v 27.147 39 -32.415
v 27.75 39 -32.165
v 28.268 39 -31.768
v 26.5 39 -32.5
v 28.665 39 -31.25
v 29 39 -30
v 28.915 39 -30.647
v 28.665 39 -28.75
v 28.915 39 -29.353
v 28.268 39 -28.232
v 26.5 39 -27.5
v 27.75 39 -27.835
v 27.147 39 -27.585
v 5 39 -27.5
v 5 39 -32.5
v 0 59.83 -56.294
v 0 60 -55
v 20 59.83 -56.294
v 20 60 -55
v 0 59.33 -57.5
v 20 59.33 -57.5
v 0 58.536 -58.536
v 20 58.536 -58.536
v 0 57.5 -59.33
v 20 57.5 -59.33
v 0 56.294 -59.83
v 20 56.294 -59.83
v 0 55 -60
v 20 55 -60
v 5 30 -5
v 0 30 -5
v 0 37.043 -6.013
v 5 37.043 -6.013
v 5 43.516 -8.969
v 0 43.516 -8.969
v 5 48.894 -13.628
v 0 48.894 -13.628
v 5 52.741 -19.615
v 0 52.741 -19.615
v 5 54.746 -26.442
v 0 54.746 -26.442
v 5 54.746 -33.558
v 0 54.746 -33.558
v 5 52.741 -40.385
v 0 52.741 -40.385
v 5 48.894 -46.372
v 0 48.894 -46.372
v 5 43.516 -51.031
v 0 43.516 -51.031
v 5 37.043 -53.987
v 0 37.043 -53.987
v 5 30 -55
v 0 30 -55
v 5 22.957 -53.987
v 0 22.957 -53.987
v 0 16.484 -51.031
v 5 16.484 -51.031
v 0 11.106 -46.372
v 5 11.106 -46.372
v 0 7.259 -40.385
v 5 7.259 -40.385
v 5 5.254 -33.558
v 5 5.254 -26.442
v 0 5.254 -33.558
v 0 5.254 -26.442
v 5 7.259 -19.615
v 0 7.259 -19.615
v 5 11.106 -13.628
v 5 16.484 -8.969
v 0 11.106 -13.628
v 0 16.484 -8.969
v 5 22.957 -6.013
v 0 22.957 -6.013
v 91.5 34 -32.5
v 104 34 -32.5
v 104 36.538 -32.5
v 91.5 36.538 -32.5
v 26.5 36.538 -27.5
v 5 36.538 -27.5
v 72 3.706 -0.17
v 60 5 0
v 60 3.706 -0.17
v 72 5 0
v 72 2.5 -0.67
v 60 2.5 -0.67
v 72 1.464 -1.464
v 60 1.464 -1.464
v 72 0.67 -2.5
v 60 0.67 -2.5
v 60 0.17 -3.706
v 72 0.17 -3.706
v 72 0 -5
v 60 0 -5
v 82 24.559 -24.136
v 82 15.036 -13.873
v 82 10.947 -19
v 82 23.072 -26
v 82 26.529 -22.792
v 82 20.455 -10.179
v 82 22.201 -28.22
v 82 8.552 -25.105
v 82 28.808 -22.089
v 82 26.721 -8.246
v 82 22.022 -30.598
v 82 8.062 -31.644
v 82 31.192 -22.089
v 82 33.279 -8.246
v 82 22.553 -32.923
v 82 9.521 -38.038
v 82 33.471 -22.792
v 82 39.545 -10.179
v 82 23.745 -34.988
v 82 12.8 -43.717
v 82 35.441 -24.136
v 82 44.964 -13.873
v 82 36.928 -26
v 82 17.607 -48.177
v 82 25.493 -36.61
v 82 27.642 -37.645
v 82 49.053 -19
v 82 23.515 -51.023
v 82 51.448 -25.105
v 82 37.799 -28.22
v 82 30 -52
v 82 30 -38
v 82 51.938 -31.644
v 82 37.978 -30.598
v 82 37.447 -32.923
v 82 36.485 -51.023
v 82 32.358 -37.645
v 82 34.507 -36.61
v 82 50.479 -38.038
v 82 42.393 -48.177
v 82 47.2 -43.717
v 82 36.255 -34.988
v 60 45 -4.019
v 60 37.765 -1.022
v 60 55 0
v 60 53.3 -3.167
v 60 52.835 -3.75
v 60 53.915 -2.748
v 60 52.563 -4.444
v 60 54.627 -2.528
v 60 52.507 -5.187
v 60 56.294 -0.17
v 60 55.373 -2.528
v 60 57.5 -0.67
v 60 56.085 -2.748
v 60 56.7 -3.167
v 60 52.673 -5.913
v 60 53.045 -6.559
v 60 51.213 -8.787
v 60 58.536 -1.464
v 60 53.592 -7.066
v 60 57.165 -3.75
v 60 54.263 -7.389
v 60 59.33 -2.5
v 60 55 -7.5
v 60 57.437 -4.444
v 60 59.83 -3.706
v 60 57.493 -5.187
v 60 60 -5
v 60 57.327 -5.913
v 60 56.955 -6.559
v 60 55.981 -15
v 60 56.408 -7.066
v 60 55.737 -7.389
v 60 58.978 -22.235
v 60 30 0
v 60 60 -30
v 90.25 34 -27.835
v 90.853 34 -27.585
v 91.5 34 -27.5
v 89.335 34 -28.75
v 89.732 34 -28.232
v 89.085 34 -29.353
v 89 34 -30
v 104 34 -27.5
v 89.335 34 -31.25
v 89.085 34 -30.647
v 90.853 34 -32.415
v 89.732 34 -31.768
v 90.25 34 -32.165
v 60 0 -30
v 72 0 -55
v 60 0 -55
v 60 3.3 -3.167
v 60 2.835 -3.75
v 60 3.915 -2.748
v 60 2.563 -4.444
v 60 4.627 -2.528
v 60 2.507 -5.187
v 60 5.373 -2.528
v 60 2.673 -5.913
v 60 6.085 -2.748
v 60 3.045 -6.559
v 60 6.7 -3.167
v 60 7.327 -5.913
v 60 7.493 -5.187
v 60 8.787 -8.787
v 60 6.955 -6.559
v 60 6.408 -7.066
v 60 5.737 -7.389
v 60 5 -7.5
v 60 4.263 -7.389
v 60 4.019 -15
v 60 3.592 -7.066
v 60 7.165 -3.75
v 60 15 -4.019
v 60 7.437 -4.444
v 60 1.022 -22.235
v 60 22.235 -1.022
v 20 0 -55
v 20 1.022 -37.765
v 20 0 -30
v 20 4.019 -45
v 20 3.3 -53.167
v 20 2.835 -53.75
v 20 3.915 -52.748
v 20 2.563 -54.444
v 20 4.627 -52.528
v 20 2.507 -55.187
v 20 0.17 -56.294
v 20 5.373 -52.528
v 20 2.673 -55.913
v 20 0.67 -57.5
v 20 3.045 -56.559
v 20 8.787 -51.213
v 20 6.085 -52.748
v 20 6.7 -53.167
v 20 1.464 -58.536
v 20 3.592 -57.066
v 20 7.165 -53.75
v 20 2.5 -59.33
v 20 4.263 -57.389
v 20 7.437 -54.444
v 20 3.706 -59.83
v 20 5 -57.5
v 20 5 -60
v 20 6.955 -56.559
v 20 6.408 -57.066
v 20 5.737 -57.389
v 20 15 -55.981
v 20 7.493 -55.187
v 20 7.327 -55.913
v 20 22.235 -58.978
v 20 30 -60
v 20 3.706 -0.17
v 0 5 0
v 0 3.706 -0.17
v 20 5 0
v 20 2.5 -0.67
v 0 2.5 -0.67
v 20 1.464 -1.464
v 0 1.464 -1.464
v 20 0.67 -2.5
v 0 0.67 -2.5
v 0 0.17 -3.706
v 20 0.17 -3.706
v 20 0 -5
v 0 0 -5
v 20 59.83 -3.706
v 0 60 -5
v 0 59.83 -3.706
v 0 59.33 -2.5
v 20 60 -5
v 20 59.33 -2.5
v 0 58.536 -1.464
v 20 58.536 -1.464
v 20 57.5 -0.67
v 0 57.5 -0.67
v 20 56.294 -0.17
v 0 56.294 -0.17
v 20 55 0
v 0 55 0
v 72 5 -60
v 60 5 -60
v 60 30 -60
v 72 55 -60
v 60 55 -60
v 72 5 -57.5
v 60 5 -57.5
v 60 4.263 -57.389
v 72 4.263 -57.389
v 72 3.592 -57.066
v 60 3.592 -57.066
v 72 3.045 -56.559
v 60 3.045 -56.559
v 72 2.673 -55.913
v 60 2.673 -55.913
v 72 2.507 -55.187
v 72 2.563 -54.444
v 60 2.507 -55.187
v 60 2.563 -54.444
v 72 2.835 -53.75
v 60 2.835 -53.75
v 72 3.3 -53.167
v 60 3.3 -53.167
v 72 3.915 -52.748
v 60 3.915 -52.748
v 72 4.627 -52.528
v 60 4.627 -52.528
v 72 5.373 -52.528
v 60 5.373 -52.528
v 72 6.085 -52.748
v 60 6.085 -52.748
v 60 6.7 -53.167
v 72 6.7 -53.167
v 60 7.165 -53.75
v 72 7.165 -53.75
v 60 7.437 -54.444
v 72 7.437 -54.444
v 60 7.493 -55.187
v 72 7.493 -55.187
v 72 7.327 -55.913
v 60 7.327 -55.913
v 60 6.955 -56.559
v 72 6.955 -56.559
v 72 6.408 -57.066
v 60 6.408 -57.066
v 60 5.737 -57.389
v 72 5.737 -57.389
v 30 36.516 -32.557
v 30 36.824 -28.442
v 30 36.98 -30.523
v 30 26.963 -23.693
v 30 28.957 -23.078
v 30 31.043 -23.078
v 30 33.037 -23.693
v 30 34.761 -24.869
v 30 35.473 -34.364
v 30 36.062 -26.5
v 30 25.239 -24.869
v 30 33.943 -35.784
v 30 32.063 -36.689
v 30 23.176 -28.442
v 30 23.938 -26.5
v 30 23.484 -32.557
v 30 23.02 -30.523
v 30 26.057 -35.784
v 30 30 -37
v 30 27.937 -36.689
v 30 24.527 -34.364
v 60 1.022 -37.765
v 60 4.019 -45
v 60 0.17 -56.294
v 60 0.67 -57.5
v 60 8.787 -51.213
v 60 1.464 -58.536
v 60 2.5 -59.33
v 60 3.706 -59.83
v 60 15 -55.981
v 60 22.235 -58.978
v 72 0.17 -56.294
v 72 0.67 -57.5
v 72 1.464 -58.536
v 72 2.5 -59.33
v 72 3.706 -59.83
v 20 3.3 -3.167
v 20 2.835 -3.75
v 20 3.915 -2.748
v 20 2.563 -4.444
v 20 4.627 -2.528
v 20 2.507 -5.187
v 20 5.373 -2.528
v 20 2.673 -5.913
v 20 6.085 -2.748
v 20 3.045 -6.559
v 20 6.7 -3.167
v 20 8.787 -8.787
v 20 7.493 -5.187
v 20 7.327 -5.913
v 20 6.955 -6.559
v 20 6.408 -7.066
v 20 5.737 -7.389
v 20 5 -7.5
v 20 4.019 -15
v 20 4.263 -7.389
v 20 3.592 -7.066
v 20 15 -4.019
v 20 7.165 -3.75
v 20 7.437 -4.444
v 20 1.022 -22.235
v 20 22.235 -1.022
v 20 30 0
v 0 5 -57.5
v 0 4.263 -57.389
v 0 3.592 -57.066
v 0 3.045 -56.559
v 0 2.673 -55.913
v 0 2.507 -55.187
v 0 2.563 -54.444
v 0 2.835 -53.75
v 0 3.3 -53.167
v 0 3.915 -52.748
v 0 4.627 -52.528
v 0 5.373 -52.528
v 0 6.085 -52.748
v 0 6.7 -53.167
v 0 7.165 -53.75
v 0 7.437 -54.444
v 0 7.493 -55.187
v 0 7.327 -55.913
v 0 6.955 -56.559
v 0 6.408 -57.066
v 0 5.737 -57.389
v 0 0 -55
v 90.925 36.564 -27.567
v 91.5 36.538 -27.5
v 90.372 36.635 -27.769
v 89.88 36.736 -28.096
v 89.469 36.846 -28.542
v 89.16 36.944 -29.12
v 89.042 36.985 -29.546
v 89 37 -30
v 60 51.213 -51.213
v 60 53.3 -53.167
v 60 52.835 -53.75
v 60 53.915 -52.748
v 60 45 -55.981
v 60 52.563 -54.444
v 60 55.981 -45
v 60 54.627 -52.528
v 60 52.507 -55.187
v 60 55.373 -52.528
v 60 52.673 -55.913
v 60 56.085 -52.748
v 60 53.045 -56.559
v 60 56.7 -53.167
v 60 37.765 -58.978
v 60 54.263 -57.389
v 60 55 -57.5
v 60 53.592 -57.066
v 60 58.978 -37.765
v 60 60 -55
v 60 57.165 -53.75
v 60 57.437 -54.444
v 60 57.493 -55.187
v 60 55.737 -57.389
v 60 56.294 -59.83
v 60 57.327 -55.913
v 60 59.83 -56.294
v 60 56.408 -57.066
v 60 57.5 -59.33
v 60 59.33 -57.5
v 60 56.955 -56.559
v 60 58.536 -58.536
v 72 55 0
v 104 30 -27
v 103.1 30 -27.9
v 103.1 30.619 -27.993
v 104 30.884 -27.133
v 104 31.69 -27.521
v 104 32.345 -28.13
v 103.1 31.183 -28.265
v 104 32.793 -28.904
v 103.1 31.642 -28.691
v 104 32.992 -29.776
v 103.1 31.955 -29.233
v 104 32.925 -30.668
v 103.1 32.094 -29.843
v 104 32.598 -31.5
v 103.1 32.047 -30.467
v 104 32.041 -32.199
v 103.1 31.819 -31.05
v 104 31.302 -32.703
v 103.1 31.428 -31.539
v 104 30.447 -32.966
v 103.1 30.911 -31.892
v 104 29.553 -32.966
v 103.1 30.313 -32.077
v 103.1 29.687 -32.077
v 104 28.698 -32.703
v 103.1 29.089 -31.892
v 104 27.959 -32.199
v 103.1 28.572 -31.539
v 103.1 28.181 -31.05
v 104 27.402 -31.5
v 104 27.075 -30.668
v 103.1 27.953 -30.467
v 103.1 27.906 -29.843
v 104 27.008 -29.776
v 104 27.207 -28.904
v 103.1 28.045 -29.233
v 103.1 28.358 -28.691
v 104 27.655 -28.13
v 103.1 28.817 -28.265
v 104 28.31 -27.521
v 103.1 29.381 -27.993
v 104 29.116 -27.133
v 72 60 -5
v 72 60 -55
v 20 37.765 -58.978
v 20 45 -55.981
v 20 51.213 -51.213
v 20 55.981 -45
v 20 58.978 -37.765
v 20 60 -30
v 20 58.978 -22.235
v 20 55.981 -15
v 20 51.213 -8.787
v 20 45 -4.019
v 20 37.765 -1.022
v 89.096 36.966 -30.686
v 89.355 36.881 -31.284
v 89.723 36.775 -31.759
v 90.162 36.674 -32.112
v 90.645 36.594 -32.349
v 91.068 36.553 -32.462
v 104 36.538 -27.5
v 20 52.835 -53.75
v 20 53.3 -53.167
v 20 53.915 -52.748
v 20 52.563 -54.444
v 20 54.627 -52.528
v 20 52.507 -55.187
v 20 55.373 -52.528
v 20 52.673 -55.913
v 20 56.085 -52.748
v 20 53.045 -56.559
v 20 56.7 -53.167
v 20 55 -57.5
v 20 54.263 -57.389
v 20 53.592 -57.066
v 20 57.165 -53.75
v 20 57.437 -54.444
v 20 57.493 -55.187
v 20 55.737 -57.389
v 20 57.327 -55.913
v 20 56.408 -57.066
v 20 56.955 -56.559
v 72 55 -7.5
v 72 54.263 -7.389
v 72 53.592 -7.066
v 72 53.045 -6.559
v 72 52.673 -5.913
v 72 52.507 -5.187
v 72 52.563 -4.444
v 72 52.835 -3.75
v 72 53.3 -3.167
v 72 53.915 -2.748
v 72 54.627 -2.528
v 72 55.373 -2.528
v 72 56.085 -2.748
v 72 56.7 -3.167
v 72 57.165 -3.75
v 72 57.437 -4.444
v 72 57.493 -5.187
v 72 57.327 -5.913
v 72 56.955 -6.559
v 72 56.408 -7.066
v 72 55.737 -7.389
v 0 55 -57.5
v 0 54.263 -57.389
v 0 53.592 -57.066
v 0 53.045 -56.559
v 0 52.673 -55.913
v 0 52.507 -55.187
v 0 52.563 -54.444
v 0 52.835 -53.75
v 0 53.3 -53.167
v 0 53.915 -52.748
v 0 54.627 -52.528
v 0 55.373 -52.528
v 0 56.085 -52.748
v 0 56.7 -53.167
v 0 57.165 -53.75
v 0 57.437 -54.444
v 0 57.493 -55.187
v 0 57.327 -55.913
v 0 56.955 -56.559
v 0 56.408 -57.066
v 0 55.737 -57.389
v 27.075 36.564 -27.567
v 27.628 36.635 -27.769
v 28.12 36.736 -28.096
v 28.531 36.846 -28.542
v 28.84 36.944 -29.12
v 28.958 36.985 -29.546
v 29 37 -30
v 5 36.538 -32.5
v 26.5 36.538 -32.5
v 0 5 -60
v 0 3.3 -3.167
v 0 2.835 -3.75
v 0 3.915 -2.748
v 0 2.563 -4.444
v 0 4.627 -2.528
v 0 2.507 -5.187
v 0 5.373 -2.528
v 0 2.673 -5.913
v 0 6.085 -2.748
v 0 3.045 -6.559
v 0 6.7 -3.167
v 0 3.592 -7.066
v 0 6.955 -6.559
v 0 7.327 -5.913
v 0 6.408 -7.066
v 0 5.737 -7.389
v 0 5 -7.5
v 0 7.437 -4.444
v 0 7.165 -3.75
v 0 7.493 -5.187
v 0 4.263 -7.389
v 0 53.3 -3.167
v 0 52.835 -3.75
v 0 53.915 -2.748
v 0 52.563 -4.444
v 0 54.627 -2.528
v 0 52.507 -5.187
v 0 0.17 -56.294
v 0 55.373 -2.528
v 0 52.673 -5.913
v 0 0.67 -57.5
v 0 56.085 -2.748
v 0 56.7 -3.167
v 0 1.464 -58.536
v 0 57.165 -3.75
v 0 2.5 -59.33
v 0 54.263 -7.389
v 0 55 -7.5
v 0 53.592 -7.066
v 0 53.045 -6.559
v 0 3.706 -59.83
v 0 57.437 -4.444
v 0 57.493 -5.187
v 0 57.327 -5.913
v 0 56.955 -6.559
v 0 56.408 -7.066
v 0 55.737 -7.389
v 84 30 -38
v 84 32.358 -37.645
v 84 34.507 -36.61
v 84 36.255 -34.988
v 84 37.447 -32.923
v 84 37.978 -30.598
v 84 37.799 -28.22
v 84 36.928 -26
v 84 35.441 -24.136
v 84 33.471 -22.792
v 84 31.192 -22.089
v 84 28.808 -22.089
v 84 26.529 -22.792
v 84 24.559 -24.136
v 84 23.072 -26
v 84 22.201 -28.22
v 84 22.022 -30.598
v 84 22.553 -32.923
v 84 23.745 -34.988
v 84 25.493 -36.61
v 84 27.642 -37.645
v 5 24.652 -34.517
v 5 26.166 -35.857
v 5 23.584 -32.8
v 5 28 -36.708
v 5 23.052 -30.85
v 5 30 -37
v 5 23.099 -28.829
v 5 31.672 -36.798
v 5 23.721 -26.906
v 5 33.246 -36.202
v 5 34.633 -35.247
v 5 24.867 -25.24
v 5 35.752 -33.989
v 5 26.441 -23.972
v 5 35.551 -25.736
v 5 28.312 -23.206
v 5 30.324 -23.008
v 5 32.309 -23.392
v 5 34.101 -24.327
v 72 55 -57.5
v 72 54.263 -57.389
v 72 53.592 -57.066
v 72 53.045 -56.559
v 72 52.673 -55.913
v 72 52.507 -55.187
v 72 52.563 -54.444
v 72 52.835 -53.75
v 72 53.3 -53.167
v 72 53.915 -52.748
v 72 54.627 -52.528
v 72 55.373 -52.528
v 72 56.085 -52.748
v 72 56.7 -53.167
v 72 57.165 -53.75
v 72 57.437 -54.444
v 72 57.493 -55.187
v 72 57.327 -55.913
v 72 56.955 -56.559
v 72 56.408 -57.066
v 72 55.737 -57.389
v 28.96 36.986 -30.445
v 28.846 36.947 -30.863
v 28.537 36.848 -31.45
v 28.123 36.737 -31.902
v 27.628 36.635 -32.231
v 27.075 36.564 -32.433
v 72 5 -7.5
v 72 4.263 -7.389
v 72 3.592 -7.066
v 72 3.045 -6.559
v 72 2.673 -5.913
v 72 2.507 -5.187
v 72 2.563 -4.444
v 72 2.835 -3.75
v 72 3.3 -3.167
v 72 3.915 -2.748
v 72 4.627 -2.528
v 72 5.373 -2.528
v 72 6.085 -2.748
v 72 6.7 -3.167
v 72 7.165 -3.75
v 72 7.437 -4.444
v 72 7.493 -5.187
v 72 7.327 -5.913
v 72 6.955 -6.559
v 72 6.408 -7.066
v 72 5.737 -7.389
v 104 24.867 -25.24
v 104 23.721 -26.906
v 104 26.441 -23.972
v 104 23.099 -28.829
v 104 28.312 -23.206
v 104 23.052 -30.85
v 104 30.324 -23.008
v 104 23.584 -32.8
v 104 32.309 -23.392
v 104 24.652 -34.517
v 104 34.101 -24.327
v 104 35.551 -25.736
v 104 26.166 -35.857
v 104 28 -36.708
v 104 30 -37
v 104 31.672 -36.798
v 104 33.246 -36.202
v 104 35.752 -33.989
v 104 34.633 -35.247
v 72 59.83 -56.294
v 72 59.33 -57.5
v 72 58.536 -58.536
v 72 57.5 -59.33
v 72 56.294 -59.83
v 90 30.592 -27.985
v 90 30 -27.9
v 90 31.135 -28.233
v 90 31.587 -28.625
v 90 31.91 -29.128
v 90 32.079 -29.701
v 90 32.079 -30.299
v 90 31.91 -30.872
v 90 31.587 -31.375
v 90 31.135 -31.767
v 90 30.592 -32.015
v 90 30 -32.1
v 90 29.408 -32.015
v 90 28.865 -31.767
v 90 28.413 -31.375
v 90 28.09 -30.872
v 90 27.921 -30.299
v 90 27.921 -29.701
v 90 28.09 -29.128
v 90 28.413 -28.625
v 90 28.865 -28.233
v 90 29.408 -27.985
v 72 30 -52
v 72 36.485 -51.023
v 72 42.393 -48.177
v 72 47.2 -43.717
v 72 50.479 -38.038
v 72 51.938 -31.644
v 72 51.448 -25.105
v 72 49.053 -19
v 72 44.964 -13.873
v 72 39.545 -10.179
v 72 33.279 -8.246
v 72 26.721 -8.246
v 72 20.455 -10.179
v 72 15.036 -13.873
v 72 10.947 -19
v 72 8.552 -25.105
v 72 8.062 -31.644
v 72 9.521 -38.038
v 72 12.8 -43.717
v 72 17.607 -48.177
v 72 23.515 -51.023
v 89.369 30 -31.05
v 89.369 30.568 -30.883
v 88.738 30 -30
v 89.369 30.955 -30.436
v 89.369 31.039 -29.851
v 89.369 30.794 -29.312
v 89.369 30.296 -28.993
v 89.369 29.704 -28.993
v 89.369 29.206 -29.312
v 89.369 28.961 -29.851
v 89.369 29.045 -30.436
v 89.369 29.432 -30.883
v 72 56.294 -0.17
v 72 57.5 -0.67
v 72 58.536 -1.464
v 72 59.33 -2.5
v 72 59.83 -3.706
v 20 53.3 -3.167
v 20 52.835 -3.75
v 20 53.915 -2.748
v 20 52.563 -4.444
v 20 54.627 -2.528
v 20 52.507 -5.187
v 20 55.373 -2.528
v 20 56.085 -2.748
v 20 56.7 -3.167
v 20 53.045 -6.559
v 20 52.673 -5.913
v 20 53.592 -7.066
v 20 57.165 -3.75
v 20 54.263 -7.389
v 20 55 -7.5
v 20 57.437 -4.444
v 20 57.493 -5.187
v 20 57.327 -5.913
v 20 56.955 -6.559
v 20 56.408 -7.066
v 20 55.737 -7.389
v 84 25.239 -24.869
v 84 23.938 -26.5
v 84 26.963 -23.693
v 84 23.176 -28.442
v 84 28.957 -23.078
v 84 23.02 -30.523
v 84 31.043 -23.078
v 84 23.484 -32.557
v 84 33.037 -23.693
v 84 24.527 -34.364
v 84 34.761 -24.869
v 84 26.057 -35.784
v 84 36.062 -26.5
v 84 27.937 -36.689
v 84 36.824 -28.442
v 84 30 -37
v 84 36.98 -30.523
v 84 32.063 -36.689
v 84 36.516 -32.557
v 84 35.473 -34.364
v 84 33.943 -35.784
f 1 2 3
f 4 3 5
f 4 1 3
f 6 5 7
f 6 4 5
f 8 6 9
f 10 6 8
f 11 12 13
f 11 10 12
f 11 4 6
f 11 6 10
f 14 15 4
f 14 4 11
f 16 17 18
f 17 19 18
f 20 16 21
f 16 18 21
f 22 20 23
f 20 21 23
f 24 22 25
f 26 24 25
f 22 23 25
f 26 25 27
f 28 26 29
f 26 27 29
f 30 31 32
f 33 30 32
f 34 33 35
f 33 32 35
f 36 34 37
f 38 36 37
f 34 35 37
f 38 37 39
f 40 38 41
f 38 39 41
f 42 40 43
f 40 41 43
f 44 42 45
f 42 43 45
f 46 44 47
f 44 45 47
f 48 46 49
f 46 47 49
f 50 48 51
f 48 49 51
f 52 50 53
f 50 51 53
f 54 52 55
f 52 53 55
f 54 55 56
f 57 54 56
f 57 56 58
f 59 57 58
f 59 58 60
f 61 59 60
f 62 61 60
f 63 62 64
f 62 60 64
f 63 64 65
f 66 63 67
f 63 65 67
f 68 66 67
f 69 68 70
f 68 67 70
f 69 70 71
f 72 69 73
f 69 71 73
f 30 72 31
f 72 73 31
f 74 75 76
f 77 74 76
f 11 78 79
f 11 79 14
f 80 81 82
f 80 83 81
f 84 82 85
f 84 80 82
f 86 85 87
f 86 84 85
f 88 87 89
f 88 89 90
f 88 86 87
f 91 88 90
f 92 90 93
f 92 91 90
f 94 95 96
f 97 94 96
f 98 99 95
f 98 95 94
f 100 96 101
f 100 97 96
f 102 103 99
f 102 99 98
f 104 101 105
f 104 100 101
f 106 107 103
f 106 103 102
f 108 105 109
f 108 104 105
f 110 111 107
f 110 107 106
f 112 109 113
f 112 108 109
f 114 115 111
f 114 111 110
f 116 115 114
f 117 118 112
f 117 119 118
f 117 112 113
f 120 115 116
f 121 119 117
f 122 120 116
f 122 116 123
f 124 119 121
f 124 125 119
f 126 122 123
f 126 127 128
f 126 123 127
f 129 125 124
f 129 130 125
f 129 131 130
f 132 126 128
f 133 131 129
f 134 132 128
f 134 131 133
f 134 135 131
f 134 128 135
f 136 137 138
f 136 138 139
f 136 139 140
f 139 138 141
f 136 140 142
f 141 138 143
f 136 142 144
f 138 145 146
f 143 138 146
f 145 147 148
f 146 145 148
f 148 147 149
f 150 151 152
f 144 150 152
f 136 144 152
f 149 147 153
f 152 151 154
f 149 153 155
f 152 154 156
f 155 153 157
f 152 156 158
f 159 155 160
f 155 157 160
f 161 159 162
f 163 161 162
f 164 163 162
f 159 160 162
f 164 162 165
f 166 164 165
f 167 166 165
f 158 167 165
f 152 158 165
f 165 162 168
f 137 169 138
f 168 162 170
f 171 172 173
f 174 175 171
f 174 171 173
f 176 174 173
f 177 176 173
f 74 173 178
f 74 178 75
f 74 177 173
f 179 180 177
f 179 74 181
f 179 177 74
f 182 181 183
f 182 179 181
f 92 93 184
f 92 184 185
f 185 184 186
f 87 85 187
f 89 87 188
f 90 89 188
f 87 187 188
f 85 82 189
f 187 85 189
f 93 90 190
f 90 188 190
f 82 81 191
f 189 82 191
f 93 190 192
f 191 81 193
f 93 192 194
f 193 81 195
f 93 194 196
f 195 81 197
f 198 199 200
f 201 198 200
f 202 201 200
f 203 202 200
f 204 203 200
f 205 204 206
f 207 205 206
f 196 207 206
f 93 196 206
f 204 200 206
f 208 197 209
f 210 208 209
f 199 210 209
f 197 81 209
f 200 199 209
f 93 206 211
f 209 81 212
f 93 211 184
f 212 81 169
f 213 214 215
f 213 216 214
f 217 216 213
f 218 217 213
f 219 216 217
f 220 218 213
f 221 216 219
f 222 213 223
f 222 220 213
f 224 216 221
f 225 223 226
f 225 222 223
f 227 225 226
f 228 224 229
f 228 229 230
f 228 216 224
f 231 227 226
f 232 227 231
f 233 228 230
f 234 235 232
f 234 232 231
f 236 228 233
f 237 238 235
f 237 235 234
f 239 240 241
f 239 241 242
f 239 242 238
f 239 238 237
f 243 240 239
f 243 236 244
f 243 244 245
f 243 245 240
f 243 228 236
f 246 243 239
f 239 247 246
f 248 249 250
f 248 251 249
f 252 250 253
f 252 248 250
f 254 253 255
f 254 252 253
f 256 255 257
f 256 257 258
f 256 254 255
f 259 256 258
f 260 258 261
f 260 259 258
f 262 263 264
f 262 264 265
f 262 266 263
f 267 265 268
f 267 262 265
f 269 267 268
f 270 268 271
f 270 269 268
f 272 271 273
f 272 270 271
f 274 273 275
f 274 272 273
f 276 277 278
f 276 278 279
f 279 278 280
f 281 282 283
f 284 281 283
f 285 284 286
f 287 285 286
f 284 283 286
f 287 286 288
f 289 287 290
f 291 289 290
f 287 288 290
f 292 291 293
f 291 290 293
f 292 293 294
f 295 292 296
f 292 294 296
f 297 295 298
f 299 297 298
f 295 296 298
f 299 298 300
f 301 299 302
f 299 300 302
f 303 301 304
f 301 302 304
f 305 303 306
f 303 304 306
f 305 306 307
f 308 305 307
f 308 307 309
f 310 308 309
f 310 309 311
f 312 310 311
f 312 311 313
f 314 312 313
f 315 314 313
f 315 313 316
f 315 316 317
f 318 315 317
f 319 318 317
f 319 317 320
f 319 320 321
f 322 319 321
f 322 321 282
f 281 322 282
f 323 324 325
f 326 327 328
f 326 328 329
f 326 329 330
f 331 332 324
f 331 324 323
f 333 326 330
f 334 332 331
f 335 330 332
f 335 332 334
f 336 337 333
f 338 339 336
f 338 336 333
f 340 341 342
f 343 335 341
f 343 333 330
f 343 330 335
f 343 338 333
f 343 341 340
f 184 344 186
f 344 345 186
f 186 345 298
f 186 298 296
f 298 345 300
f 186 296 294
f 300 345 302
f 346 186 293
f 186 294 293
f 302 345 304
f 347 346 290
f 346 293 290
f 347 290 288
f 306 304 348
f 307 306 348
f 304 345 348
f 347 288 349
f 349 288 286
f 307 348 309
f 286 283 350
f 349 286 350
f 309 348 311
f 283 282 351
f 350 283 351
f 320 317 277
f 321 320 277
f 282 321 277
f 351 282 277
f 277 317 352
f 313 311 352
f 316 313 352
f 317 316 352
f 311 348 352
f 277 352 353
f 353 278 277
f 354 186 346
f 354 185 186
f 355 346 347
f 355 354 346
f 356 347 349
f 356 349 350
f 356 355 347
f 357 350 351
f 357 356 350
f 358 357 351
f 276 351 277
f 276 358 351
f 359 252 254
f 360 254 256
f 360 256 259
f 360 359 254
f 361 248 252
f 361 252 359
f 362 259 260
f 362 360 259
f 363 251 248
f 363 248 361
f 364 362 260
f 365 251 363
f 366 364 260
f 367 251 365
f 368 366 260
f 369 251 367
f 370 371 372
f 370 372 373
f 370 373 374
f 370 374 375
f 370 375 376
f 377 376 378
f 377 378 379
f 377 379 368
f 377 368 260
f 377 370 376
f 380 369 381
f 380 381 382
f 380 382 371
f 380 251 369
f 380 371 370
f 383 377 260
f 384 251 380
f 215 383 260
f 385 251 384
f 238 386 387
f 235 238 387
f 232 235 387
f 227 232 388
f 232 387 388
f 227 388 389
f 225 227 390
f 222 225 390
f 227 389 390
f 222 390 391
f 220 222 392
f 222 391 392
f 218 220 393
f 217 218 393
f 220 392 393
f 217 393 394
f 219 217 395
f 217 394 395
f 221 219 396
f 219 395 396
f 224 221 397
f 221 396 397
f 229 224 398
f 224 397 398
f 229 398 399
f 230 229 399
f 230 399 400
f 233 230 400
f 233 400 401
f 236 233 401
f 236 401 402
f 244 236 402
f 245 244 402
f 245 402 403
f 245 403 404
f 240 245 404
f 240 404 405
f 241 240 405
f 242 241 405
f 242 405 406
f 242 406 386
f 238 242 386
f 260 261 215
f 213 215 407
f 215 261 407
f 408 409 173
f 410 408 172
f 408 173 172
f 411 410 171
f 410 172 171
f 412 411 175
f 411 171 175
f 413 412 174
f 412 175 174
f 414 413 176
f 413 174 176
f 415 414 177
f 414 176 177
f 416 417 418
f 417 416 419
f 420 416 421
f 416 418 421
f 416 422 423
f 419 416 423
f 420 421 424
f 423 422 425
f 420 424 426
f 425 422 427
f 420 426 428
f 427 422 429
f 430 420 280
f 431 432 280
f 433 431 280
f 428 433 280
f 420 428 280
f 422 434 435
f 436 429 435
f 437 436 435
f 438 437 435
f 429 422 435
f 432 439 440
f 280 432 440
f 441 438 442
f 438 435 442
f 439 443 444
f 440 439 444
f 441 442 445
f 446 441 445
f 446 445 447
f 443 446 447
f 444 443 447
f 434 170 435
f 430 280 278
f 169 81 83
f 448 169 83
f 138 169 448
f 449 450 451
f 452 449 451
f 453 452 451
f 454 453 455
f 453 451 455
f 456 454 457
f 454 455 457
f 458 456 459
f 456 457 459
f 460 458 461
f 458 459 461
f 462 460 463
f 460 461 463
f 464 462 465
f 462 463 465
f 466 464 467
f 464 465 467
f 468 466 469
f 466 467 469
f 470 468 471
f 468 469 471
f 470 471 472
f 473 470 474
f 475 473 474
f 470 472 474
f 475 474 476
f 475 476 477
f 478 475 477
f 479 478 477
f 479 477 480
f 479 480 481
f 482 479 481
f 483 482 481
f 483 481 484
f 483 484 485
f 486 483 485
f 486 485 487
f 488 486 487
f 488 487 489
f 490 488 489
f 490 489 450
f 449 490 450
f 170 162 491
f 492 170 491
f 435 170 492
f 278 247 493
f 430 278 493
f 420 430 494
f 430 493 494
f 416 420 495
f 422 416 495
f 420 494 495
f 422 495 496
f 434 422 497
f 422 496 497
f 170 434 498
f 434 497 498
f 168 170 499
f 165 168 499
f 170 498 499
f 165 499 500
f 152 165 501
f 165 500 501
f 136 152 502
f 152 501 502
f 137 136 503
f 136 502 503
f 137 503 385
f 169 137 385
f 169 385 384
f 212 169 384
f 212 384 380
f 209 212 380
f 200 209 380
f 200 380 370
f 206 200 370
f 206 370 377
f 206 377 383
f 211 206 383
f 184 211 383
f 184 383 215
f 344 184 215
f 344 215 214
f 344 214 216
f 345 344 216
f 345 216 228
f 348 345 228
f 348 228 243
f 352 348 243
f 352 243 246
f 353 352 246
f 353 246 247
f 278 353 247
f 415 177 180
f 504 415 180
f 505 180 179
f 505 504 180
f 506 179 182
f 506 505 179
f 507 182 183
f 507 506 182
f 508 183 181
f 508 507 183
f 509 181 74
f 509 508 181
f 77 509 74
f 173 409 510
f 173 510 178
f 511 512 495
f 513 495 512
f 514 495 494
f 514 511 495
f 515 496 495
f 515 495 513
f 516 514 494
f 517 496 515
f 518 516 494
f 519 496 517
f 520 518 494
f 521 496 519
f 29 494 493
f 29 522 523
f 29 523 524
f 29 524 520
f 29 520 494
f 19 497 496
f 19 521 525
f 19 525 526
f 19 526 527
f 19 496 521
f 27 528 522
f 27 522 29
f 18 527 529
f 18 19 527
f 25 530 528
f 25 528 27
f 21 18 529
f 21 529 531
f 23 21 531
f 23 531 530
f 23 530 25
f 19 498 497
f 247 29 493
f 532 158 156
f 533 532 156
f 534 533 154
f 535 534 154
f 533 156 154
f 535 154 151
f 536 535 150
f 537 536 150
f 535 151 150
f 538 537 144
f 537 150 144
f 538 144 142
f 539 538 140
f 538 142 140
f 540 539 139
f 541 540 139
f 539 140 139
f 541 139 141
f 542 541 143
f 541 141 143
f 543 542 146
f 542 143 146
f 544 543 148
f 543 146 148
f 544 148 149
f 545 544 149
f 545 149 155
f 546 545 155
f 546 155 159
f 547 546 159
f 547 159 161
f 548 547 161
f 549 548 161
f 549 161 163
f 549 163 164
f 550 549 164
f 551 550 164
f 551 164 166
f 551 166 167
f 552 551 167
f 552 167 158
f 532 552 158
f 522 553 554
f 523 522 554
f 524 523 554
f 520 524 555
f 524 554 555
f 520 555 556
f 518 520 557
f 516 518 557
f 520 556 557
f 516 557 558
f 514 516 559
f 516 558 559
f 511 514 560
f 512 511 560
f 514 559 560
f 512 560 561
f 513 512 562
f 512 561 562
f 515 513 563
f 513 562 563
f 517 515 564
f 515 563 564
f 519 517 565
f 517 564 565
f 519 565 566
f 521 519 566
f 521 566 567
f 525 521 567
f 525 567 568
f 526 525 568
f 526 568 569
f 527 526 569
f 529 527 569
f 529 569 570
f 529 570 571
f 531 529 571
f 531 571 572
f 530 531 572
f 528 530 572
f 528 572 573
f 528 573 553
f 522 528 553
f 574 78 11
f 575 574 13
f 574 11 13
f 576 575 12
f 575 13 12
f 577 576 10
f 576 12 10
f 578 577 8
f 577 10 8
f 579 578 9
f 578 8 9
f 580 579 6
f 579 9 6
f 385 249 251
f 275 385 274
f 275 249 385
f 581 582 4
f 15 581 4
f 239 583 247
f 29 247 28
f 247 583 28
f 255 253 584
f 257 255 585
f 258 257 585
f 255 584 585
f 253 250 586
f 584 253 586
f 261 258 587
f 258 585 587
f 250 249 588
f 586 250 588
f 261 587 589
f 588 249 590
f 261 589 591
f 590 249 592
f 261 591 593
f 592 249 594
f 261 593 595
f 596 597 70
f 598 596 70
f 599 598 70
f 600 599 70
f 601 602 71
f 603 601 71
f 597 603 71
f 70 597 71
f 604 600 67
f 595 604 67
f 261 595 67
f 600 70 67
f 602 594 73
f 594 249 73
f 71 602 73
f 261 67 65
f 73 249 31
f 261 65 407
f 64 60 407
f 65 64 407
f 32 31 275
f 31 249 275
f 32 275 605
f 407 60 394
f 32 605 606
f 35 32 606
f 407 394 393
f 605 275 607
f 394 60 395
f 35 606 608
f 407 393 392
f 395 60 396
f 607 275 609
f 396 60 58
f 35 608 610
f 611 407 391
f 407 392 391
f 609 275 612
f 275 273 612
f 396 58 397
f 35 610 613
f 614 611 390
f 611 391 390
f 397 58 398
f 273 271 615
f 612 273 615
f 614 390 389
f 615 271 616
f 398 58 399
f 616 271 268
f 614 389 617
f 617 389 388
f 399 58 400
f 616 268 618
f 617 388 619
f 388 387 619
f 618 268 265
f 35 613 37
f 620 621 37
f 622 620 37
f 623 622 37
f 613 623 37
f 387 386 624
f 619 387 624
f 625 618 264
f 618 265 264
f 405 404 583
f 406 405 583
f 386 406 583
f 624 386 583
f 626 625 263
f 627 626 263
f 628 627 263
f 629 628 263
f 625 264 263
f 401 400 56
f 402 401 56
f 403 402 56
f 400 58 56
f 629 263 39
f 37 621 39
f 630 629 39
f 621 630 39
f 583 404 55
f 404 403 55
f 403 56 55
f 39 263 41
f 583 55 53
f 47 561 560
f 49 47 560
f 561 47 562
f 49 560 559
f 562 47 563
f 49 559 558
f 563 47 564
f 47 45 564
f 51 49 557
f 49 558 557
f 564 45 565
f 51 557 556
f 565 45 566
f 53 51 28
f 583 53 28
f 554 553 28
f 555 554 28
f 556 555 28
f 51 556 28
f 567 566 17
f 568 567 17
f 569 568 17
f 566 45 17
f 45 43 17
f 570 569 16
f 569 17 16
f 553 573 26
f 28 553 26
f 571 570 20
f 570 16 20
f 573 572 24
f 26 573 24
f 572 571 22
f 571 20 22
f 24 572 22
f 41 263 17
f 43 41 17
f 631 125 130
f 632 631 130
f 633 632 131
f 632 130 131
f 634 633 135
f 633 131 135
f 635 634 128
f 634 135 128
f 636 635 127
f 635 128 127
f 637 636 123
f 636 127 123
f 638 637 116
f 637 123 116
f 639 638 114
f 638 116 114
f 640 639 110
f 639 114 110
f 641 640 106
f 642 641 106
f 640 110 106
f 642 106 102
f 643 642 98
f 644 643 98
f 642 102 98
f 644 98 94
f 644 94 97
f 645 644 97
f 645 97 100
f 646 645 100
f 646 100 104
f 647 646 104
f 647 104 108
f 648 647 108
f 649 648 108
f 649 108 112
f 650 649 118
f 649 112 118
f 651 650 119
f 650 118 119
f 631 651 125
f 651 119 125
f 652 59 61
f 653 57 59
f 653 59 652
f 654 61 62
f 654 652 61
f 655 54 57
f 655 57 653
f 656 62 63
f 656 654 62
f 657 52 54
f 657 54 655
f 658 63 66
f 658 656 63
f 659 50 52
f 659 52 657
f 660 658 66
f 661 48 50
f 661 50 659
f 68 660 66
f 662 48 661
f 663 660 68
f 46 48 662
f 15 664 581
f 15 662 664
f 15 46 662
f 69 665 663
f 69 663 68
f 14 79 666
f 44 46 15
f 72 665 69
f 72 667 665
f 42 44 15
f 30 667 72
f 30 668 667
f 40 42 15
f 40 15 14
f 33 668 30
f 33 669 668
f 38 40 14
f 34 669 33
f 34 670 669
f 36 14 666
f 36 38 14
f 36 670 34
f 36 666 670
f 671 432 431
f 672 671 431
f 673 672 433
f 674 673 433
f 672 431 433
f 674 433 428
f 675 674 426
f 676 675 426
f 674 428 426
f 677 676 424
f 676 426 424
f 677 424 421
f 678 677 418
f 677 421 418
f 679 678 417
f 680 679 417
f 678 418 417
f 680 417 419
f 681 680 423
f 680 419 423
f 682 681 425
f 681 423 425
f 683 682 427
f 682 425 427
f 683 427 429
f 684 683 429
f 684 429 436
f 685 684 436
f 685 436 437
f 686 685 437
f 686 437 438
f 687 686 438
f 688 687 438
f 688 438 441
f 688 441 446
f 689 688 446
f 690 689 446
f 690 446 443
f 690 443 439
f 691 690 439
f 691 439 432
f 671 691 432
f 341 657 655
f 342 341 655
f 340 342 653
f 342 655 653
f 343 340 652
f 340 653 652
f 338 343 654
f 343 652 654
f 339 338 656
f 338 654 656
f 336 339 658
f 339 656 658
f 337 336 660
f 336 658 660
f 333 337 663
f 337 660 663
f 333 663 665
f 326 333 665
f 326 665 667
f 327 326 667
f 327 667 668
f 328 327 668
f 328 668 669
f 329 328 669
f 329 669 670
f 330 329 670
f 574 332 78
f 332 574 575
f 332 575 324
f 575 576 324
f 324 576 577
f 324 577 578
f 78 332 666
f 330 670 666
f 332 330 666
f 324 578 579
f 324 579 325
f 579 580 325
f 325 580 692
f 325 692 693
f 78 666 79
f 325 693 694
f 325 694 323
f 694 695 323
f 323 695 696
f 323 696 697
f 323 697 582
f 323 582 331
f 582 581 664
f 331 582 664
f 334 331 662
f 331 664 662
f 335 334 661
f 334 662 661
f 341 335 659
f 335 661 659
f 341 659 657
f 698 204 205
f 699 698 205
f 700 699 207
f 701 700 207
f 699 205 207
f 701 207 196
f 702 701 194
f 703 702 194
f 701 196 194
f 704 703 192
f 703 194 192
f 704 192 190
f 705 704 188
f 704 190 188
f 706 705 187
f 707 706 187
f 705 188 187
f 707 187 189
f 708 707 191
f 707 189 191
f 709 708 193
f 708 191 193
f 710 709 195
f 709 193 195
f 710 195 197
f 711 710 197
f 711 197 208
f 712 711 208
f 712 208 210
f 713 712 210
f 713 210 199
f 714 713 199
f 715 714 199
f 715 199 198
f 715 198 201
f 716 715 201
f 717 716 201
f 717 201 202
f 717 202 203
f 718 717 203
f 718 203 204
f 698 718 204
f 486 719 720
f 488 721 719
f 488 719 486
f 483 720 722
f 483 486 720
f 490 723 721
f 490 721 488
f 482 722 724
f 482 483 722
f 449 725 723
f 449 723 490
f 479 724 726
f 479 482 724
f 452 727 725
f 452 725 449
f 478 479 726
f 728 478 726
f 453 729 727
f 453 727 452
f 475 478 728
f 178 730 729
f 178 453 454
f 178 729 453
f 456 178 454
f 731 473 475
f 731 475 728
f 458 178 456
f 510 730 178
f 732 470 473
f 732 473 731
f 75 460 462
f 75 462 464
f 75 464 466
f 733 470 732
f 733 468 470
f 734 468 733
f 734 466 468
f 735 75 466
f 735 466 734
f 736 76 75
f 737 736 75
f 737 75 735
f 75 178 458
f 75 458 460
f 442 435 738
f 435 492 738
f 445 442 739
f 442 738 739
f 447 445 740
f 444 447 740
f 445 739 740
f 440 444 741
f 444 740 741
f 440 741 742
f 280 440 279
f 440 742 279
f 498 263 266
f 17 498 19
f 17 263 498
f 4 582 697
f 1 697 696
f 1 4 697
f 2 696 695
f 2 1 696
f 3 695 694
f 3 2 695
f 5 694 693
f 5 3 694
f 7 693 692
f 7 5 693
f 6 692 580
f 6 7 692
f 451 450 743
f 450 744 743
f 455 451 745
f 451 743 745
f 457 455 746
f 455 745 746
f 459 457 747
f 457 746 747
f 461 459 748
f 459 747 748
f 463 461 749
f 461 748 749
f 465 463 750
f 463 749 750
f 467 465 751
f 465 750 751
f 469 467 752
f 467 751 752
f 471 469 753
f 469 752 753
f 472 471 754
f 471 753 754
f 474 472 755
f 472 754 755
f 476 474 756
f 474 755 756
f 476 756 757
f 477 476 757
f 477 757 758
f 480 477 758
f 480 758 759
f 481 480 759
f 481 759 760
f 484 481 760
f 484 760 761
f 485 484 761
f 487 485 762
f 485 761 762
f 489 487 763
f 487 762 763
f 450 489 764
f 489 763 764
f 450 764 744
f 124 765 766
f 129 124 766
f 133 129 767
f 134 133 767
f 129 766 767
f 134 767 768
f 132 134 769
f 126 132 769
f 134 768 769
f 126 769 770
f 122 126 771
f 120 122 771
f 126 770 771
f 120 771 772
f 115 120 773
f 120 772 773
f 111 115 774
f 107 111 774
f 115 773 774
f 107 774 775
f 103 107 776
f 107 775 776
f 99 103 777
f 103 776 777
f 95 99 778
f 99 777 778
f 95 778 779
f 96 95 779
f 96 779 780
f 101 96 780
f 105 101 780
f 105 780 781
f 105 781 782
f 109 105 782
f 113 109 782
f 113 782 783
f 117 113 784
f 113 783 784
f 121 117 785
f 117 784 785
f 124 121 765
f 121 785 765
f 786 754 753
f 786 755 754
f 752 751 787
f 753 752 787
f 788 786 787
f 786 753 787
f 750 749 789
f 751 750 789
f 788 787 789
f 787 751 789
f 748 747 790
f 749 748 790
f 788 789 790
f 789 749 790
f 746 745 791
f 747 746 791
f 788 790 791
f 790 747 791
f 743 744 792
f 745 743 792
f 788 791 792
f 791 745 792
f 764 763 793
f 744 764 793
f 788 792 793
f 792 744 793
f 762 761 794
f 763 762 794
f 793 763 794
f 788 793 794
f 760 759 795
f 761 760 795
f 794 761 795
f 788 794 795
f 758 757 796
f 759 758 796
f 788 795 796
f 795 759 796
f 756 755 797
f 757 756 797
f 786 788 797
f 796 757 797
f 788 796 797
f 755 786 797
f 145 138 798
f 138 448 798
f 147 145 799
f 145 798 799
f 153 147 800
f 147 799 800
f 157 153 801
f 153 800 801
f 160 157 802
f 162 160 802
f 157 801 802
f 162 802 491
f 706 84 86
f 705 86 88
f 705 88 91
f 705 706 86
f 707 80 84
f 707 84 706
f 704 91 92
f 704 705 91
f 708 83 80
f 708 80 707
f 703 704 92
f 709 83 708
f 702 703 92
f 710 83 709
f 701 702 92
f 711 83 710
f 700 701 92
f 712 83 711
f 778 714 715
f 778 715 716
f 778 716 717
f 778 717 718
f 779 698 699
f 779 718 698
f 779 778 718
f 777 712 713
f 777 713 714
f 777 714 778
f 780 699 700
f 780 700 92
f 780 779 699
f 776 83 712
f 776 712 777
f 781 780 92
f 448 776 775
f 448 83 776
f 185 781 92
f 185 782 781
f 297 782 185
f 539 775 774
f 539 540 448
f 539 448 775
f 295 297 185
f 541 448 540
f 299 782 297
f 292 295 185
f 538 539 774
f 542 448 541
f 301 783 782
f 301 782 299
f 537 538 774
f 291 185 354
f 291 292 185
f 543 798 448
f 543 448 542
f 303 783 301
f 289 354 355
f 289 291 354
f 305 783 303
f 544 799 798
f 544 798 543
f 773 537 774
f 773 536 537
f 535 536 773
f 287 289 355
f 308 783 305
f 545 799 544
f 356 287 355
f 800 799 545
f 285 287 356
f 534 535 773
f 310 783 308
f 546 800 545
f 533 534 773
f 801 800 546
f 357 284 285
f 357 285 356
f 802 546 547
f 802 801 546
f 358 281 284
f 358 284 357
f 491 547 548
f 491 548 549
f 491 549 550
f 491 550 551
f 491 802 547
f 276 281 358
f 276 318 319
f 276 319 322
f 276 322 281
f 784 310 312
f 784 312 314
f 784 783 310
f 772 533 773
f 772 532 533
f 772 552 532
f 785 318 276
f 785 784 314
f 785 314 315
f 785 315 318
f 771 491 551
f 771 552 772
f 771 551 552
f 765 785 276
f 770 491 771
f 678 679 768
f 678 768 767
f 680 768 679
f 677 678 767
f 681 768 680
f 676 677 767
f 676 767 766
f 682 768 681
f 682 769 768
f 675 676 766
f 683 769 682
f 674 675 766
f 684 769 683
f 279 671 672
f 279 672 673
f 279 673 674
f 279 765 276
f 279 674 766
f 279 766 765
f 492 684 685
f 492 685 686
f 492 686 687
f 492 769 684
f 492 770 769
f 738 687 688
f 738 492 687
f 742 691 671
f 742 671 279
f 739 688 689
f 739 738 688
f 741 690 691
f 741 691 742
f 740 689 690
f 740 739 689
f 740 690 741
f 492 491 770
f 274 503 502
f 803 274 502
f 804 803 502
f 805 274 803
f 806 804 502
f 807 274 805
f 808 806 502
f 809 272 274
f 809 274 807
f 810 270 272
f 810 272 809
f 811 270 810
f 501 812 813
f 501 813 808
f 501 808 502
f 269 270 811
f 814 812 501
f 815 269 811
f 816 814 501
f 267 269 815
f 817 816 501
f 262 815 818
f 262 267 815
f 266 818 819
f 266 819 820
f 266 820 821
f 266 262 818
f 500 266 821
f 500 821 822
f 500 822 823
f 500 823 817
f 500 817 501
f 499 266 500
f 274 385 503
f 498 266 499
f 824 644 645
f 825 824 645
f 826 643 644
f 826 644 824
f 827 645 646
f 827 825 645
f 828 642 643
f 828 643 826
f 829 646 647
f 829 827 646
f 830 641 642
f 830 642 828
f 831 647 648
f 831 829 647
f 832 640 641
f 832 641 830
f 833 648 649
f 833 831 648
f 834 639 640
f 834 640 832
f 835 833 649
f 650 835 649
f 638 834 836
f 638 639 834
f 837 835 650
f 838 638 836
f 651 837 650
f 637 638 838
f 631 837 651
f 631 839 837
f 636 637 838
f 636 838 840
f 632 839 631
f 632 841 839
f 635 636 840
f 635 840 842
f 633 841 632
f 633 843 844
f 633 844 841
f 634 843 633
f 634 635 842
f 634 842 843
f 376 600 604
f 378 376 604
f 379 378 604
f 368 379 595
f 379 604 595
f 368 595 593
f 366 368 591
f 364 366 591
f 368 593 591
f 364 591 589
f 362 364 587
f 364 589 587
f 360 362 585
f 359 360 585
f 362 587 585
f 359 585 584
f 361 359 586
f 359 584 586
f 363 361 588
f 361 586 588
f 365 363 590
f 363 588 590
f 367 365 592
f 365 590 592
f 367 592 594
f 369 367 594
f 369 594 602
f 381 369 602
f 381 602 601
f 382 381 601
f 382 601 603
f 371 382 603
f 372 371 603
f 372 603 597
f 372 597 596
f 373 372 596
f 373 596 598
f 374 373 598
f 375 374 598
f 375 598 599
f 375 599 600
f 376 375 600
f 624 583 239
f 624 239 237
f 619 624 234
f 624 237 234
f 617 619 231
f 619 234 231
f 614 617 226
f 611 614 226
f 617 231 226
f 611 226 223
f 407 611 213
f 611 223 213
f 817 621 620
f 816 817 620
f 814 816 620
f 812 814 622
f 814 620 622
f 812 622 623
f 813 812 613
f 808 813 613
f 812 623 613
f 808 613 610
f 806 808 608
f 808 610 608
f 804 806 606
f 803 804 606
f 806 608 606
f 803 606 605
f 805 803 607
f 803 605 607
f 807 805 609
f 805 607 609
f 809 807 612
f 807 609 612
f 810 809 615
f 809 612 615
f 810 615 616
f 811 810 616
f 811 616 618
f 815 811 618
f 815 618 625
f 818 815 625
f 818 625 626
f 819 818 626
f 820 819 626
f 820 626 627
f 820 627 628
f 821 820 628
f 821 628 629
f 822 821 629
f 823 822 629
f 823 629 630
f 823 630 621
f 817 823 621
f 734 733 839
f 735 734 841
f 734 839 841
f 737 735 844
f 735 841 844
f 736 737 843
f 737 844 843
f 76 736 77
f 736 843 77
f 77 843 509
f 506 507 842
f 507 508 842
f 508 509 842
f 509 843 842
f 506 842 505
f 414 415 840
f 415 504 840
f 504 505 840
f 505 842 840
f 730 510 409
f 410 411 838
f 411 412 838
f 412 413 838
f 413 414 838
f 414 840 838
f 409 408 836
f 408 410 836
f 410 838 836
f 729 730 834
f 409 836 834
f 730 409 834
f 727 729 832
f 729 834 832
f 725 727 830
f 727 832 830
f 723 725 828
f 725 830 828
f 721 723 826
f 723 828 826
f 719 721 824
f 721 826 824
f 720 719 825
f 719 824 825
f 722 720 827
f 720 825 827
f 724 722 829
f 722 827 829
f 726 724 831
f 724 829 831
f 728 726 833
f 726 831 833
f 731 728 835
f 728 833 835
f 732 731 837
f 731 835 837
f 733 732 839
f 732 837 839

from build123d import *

# Parameters (mm, degrees)
SKETCH_1_W           = 60
SKETCH_1_H           = 60
EXTRUDE_1_DEPTH      = 20
SKETCH_2_R           = 30
EXTRUDE_2_DEPTH      = 40
SKETCH_3_W           = 60
SKETCH_3_H           = 60
EXTRUDE_3_DEPTH      = 12
SKETCH_4_R           = 22
EXTRUDE_4_DEPTH      = 10
SKETCH_5_R           = 7
EXTRUDE_5_DEPTH      = 22
SKETCH_6_R           = 2.5
CUT_EXTRUDE_1_DEPTH  = 135.223693885
SKETCH_7_R           = 25
CUT_EXTRUDE_2_DEPTH  = 5
SKETCH_8_R           = 7
CUT_EXTRUDE_3_DEPTH  = 25
CUT_EXTRUDE_START    = -15
CUT_EXTRUDE_5_DEPTH  = 15
FILLET_1_R           = 2.5
SKETCH_11_R          = 8
EXTRUDE_6_DEPTH      = 2
M5X0_751_D           = 4.2
M5X0_751_DEPTH       = 14
M5X0_751_CSINK_D     = 6
M5X0_751_CSINK_ANGLE = 90
M5X0_751_TIP         = 1.2618073
FILLET_2_R           = 5
SKETCH_15_W          = 5
SKETCH_15_H          = 2.461651585
CUT_EXTRUDE_6_DEPTH  = 24
FILLET_3_R           = 2.5


with BuildPart() as part:
    # Эскиз1 → Бобышка-Вытянуть1 (new body)
    with BuildSketch(Plane(origin=(0, 0, 0), x_dir=(0, 0, -1), z_dir=(1, 0, 0))):
        with Locations((30, 30)):
            Rectangle(SKETCH_1_W, SKETCH_1_H)
    extrude(amount=EXTRUDE_1_DEPTH)

    # Эскиз2 → Бобышка-Вытянуть2 (add)
    with BuildSketch(Plane(origin=(20, 0, 0), x_dir=(0, 0, -1), z_dir=(1, 0, 0))):
        with Locations((30, 30)):
            Circle(SKETCH_2_R)
    extrude(amount=EXTRUDE_2_DEPTH)

    # Эскиз3 → Бобышка-Вытянуть3 (add)
    with BuildSketch(Plane(origin=(60, 0, 0), x_dir=(0, 0, -1), z_dir=(1, 0, 0))):
        with Locations((30, 30)):
            Rectangle(SKETCH_3_W, SKETCH_3_H)
    extrude(amount=EXTRUDE_3_DEPTH)

    # Эскиз4 → Бобышка-Вытянуть4 (add)
    with BuildSketch(Plane(origin=(72, 0, 0), x_dir=(0, 0, -1), z_dir=(1, 0, 0))):
        with Locations((30, 30)):
            Circle(SKETCH_4_R)
    extrude(amount=EXTRUDE_4_DEPTH)

    # Эскиз5 → Бобышка-Вытянуть5 (add)
    with BuildSketch(Plane(origin=(82, 0, 0), x_dir=(0, 0, -1), z_dir=(1, 0, 0))):
        with Locations((30, 30)):
            Circle(SKETCH_5_R)
    extrude(amount=EXTRUDE_5_DEPTH)

    # Эскиз6 → Вырез-Вытянуть1 (cut, through all)
    with BuildSketch(Plane.ZY):
        with Locations(Location((-55, 55, 0), (0, 0, 180))):
            Circle(SKETCH_6_R)
        with Locations(Location((-5, 55, 0), (0, 0, 180))):
            Circle(SKETCH_6_R)
        with Locations(Location((-5, 5, 0), (0, 0, 180))):
            Circle(SKETCH_6_R)
        with Locations(Location((-55, 5, 0), (0, 0, 180))):
            Circle(SKETCH_6_R)
    extrude(amount=-CUT_EXTRUDE_1_DEPTH, mode=Mode.SUBTRACT)

    # Эскиз7 → Вырез-Вытянуть2 (cut)
    with BuildSketch(Plane.ZY):
        with Locations((-30, 30)):
            Circle(SKETCH_7_R)
    extrude(amount=-CUT_EXTRUDE_2_DEPTH, mode=Mode.SUBTRACT)

    # Эскиз8 → Вырез-Вытянуть3 (cut)
    with BuildSketch(Plane.ZY.offset(-5)):
        with Locations(Location((-30, 30, 0), (0, 0, 180))):
            Circle(SKETCH_8_R)
    extrude(amount=-CUT_EXTRUDE_3_DEPTH, mode=Mode.SUBTRACT)

    # Эскиз10 → Вырез-Вытянуть5 (cut)
    with BuildSketch(Plane(origin=(104, 0, 0), x_dir=(0, 0, -1), z_dir=(1, 0, 0)).offset(CUT_EXTRUDE_START)):
        with BuildLine():
            Line((27.5, 34), (32.5, 34))
            Line((32.5, 34), (32.5, 36.538348415))
            ThreePointArc((32.5, 36.538348415), (30, 37), (27.5, 36.538348415))
            Line((27.5, 36.538348415), (27.5, 34))
        make_face()
    extrude(amount=CUT_EXTRUDE_5_DEPTH, mode=Mode.SUBTRACT)

    # Скругление1
    fillet_1_edges = [part.edges().sort_by_distance(p)[0] for p in [
        (89, 35.269174208, -27.5),
        (89, 35.269174208, -32.5),
    ]]
    fillet(fillet_1_edges, radius=FILLET_1_R - 0.0001)  # a hair under: the kernel refuses the full size

    # Эскиз11 → Бобышка-Вытянуть6 (add)
    with BuildSketch(Plane(origin=(82, 0, 0), x_dir=(0, 0, -1), z_dir=(1, 0, 0))):
        with Locations((30, 30)):
            Circle(SKETCH_11_R)
    extrude(amount=EXTRUDE_6_DEPTH)

    # Отверстие обработанное метчиком M5x0.751
    with Locations(Plane(origin=(104, 0, 0), x_dir=(0, 0, -1), z_dir=(1, 0, 0))):
        with Locations((30, 30)):
            CounterSinkHole(M5X0_751_D / 2, M5X0_751_CSINK_D / 2, depth=M5X0_751_DEPTH, counter_sink_angle=M5X0_751_CSINK_ANGLE)
            with Locations((0, 0, -(M5X0_751_DEPTH + M5X0_751_TIP / 2))):  # 118° drill point
                Cone(0, M5X0_751_D / 2, M5X0_751_TIP, mode=Mode.SUBTRACT)

    # Скругление2
    fillet_2_edges = [part.edges().sort_by_distance(p)[0] for p in [
        (66, 60, 0),
        (66, 0, 0),
        (66, 0, -60),
        (66, 60, -60),
        (10, 60, 0),
        (10, 60, -60),
        (10, 0, -60),
        (10, 0, 0),
    ]]
    fillet(fillet_2_edges, radius=FILLET_2_R)

    # Эскиз15 → Вырез-Вытянуть6 (cut)
    with BuildSketch(Plane.ZY.offset(-5)):
        with Locations((-30, 37.769174208)):
            Rectangle(SKETCH_15_W, SKETCH_15_H)
    extrude(amount=-CUT_EXTRUDE_6_DEPTH, mode=Mode.SUBTRACT)

    # Скругление3
    fillet_3_edges = [part.edges().sort_by_distance(p)[0] for p in [
        (29, 37.769174208, -32.5),
        (29, 37.769174208, -27.5),
    ]]
    fillet(fillet_3_edges, radius=FILLET_3_R - 0.0001)  # a hair under: the kernel refuses the full size


solid = part.part
